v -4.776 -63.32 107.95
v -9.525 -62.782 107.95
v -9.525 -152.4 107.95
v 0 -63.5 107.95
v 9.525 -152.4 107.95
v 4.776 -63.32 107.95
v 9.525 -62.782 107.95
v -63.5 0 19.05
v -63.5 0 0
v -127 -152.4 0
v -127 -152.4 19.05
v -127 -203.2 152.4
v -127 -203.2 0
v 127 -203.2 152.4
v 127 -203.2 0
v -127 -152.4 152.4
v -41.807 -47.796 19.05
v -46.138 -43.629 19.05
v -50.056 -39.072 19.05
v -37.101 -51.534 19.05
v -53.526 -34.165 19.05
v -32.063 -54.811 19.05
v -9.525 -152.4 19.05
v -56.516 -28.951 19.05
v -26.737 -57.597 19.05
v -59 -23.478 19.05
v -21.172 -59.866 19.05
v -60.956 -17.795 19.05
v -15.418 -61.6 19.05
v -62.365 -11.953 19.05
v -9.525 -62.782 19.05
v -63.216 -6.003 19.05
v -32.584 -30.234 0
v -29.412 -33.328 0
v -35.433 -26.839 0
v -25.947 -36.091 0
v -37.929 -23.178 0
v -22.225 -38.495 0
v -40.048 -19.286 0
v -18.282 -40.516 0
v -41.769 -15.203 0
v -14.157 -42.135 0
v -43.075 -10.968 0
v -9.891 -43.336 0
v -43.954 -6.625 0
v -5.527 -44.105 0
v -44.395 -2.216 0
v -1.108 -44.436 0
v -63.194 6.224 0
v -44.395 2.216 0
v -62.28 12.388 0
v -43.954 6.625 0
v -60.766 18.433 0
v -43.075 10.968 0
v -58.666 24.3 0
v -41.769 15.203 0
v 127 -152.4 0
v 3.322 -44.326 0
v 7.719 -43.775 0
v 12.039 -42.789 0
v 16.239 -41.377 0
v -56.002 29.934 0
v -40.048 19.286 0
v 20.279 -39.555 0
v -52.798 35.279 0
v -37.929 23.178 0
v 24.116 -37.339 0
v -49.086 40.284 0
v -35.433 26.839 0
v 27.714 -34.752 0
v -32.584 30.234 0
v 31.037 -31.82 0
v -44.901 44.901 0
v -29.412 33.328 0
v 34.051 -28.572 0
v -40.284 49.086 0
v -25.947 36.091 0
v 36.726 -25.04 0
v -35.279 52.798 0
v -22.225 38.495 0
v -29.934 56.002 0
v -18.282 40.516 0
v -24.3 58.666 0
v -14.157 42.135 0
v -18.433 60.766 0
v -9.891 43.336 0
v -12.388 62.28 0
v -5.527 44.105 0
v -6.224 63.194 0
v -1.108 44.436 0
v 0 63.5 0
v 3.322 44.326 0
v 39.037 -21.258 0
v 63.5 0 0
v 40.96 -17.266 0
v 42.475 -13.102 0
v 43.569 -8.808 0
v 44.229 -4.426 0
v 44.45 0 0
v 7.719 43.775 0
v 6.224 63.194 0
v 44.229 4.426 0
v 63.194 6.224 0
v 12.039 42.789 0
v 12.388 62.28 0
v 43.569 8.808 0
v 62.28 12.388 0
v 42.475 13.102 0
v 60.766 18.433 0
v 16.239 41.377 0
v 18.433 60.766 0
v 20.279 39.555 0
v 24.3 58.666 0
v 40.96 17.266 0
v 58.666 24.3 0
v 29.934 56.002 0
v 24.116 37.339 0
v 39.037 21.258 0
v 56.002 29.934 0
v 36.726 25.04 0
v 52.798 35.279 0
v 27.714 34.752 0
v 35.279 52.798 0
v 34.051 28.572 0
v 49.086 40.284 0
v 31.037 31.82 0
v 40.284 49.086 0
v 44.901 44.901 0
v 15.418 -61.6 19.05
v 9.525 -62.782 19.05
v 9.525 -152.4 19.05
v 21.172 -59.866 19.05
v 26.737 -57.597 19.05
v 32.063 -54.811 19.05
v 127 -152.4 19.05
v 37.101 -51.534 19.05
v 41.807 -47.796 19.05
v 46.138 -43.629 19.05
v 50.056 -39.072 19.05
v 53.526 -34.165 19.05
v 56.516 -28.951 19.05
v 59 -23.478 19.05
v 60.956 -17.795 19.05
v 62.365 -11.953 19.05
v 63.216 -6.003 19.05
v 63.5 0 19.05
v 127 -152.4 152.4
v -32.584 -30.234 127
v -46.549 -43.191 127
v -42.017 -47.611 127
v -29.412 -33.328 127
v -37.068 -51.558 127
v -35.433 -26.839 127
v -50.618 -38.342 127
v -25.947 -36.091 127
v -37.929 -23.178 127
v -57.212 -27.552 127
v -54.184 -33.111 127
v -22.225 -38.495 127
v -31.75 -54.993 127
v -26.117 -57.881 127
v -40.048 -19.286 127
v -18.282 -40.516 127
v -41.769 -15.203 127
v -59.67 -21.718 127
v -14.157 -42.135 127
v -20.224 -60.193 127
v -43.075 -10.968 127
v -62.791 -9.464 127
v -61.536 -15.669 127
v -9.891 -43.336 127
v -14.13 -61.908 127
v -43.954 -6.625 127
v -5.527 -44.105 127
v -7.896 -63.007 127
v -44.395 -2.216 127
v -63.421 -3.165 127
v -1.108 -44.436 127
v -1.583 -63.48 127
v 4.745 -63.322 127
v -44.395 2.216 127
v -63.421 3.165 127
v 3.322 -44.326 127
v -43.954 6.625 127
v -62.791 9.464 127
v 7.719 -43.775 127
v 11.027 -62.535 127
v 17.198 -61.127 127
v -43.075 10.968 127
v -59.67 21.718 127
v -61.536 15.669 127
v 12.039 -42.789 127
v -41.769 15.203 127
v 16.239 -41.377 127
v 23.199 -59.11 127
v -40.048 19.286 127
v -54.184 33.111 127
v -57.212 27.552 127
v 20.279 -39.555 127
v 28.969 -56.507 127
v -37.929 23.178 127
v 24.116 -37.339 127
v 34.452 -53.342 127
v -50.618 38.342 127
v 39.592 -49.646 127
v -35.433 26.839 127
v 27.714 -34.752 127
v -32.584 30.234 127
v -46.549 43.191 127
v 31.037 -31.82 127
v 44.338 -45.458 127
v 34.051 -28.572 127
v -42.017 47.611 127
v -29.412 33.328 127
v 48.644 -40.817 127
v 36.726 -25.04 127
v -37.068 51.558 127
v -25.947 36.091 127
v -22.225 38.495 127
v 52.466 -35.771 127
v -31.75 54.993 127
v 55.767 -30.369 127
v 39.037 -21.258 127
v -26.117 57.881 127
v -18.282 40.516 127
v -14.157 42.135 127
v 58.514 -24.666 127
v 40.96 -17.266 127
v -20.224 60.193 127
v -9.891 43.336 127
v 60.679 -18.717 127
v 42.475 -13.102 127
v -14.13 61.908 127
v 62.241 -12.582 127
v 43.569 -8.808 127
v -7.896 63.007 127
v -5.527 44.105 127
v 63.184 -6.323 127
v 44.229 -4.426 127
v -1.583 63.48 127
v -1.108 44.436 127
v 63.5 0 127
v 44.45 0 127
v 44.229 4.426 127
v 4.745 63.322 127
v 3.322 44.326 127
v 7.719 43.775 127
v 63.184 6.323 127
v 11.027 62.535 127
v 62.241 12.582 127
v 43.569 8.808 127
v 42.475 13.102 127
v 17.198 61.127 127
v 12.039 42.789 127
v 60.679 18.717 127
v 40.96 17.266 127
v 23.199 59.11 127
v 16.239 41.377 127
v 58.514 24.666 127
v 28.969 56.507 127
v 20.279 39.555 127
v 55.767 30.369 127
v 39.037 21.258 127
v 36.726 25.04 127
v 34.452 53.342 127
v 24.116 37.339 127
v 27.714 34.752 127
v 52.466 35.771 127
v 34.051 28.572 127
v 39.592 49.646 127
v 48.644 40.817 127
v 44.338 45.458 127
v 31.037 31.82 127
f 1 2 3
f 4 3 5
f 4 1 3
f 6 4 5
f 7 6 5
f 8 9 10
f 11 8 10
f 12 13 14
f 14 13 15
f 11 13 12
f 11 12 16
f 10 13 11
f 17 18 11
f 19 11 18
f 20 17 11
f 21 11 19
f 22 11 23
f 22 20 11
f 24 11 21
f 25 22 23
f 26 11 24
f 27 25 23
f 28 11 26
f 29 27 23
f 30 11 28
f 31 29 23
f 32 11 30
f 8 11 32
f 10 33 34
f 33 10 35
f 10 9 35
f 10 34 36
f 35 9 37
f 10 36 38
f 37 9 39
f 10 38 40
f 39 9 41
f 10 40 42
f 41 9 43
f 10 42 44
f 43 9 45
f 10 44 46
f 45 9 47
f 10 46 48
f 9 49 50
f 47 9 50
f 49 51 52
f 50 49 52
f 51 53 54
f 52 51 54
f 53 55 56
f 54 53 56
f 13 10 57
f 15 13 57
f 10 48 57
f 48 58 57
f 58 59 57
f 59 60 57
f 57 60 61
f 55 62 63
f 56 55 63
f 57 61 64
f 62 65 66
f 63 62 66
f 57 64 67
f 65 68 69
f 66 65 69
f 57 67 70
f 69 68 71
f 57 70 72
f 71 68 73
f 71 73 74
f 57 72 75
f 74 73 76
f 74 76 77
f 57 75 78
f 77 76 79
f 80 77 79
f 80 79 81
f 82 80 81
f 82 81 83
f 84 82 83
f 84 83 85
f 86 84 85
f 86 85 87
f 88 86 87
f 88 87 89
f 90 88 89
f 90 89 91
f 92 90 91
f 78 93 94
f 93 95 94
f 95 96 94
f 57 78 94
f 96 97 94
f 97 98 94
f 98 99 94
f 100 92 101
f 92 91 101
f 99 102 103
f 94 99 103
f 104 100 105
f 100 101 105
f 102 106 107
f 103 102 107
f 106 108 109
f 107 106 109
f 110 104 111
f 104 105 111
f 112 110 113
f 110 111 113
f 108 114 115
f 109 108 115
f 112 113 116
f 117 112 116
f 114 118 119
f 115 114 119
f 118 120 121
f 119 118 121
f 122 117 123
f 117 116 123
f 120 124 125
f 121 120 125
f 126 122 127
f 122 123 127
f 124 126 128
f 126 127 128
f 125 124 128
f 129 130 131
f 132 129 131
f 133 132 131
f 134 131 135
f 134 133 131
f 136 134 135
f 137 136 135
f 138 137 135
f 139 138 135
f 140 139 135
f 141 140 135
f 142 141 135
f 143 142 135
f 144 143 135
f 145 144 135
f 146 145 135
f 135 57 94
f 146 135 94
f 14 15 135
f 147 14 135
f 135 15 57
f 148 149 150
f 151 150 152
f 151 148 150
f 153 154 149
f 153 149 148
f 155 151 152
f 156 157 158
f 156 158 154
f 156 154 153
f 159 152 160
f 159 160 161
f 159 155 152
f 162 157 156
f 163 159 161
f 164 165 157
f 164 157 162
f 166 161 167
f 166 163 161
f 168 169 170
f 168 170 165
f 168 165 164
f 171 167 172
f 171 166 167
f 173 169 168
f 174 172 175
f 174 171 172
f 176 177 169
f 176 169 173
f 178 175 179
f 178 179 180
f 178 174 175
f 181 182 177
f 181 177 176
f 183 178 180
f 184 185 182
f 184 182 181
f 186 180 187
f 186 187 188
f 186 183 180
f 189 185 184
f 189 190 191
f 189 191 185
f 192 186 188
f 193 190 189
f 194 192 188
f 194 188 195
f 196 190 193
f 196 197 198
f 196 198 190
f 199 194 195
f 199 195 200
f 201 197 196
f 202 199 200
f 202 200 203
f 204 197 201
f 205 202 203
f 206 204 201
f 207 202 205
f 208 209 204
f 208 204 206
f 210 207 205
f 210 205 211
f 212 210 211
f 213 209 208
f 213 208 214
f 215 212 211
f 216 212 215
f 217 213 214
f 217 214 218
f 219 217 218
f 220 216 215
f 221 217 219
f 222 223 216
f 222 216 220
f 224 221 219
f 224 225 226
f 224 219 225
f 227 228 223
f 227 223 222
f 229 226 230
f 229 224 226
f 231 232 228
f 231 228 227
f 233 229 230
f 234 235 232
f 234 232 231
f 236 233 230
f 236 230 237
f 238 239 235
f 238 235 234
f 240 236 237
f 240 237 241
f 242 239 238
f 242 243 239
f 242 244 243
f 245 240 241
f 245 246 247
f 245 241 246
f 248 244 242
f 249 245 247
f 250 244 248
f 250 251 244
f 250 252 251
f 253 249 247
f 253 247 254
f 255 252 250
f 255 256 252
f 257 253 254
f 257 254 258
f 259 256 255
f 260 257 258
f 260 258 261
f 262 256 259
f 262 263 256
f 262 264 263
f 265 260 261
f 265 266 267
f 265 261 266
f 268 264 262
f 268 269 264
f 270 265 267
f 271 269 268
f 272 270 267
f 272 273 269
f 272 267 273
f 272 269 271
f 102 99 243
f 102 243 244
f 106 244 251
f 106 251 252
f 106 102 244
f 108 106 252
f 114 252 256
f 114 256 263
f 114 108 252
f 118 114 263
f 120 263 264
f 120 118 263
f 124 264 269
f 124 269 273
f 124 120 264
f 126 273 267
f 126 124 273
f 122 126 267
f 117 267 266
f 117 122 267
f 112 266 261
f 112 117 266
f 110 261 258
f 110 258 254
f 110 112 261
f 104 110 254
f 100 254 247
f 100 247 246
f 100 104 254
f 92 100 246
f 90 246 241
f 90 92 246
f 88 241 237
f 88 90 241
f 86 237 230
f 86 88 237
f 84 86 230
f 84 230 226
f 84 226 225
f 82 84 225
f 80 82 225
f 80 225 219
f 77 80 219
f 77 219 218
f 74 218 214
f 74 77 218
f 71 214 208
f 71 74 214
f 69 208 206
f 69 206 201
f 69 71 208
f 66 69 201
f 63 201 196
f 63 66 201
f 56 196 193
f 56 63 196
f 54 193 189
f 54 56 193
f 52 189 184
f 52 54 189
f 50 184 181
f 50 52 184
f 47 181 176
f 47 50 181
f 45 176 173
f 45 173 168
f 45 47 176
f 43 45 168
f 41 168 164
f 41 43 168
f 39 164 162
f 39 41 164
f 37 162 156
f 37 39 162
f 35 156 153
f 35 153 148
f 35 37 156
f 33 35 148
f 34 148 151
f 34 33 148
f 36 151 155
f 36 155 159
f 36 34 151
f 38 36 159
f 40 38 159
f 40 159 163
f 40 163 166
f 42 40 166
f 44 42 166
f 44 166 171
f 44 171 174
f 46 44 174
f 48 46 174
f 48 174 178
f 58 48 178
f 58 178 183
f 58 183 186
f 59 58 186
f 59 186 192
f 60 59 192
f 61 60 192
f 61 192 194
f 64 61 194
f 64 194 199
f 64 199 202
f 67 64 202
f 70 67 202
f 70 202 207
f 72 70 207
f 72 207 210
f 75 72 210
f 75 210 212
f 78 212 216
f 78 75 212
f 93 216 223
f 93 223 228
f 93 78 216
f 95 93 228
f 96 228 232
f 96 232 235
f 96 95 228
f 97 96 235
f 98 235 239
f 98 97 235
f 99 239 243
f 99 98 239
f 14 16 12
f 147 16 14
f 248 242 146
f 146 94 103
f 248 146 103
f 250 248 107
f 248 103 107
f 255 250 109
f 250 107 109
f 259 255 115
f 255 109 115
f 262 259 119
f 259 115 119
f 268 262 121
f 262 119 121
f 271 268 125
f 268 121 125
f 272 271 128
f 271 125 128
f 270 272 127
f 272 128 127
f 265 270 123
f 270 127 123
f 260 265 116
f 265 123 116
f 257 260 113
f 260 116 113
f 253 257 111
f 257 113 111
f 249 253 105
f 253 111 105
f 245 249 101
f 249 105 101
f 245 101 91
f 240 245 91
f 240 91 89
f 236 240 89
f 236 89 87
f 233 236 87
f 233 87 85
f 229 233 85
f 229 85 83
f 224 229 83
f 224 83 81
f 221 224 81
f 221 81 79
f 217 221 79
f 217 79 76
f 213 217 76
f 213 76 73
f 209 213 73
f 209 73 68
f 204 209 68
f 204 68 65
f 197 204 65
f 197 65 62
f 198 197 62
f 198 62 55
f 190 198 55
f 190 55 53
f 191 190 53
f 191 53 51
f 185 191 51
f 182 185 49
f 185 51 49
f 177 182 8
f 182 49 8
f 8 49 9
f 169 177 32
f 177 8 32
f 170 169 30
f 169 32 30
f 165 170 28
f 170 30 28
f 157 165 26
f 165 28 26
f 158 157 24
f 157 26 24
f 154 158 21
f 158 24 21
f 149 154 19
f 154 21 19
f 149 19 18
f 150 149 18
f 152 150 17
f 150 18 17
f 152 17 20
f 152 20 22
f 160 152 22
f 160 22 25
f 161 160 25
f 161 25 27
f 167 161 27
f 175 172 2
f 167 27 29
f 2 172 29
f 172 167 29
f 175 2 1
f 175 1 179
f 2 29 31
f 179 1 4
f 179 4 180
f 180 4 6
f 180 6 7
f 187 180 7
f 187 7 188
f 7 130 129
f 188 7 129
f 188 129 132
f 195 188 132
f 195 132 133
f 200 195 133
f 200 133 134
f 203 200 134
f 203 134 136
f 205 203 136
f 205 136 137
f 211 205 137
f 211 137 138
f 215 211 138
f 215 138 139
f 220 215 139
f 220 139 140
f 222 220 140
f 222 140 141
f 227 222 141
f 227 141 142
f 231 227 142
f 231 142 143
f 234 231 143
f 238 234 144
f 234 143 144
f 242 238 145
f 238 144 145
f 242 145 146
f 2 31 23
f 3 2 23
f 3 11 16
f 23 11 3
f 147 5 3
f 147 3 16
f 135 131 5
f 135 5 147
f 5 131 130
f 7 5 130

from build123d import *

# Parameters (mm, degrees)
BOSS_EXTRUDE1_DEPTH = 107.95
BOSS_EXTRUDE2_DEPTH = 19.05
SKETCH1_4_R         = 44.45
BOSS_EXTRUDE3_DEPTH = 127
BOSS_EXTRUDE4_DEPTH = 152.4


with BuildPart() as part:
    # Sketch1 → Boss-Extrude1 (new body)
    with BuildSketch(Plane.XY):
        with BuildLine():
            ThreePointArc((9.525, -62.781560788), (0, -63.5), (-9.525, -62.781560788))
            Line((-9.525, -62.781560788), (-9.525, -152.4))
            Line((-9.525, -152.4), (9.525, -152.4))
            Line((9.525, -152.4), (9.525, -62.781560788))
        make_face()
    extrude(amount=BOSS_EXTRUDE1_DEPTH)

    # Sketch1<3> → Boss-Extrude2 (add)
    with BuildSketch(Plane.XY):
        with BuildLine():
            ThreePointArc((-9.525, -62.781560788), (-48.15125907, -41.396935273), (-63.5, 0))
            Line((-63.5, 0), (-127, -152.4))
            Line((-127, -152.4), (-9.525, -152.4))
            Line((-9.525, -152.4), (-9.525, -62.781560788))
        make_face()
        with BuildLine():
            Line((127, -152.4), (63.5, 0))
            ThreePointArc((63.5, 0), (48.15125907, -41.396935273), (9.525, -62.781560788))
            Line((9.525, -62.781560788), (9.525, -152.4))
            Line((9.525, -152.4), (127, -152.4))
        make_face()
    extrude(amount=BOSS_EXTRUDE2_DEPTH)

    # Sketch1<4> → Boss-Extrude3 (add)
    with BuildSketch(Plane.XY):
        with BuildLine():
            ThreePointArc((63.5, 0), (0, 63.5), (-63.5, 0))
            ThreePointArc((-63.5, 0), (-48.15125907, -41.396935273), (-9.525, -62.781560788))
            ThreePointArc((-9.525, -62.781560788), (0, -63.5), (9.525, -62.781560788))
            ThreePointArc((9.525, -62.781560788), (48.15125907, -41.396935273), (63.5, 0))
        make_face()
        Circle(SKETCH1_4_R, mode=Mode.SUBTRACT)
    extrude(amount=BOSS_EXTRUDE3_DEPTH)

    # Sketch1<5> → Boss-Extrude4 (add)
    with BuildSketch(Plane.XY):
        Polygon((-9.525, -152.4), (-127, -152.4), (-127, -203.2), (127, -203.2), (127, -152.4), (9.525, -152.4), align=None)
    extrude(amount=BOSS_EXTRUDE4_DEPTH)


solid = part.part
